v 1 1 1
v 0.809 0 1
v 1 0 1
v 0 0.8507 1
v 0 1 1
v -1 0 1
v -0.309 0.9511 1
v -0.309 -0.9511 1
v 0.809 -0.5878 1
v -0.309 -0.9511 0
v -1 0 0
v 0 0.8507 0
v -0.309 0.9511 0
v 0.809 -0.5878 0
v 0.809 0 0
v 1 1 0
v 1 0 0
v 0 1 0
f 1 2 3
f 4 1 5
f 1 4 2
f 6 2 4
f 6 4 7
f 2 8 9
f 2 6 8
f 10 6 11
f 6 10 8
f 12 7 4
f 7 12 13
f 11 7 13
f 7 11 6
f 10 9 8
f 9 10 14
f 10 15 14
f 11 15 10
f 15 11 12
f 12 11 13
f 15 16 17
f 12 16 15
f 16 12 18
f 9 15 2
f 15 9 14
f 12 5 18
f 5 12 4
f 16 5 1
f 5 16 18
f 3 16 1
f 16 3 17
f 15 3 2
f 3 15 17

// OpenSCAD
// convexity: rotate_extrude uses max(2, c); linear_extrude prints it only when > 1.
rotate_extrude(convexity = 0) square();
rotate_extrude(convexity = 3) square();
rotate_extrude(convexity = -5) square();
linear_extrude(1, convexity = 0) square();
linear_extrude(1, convexity = -2) square();
linear_extrude(1, convexity = 2) square();
